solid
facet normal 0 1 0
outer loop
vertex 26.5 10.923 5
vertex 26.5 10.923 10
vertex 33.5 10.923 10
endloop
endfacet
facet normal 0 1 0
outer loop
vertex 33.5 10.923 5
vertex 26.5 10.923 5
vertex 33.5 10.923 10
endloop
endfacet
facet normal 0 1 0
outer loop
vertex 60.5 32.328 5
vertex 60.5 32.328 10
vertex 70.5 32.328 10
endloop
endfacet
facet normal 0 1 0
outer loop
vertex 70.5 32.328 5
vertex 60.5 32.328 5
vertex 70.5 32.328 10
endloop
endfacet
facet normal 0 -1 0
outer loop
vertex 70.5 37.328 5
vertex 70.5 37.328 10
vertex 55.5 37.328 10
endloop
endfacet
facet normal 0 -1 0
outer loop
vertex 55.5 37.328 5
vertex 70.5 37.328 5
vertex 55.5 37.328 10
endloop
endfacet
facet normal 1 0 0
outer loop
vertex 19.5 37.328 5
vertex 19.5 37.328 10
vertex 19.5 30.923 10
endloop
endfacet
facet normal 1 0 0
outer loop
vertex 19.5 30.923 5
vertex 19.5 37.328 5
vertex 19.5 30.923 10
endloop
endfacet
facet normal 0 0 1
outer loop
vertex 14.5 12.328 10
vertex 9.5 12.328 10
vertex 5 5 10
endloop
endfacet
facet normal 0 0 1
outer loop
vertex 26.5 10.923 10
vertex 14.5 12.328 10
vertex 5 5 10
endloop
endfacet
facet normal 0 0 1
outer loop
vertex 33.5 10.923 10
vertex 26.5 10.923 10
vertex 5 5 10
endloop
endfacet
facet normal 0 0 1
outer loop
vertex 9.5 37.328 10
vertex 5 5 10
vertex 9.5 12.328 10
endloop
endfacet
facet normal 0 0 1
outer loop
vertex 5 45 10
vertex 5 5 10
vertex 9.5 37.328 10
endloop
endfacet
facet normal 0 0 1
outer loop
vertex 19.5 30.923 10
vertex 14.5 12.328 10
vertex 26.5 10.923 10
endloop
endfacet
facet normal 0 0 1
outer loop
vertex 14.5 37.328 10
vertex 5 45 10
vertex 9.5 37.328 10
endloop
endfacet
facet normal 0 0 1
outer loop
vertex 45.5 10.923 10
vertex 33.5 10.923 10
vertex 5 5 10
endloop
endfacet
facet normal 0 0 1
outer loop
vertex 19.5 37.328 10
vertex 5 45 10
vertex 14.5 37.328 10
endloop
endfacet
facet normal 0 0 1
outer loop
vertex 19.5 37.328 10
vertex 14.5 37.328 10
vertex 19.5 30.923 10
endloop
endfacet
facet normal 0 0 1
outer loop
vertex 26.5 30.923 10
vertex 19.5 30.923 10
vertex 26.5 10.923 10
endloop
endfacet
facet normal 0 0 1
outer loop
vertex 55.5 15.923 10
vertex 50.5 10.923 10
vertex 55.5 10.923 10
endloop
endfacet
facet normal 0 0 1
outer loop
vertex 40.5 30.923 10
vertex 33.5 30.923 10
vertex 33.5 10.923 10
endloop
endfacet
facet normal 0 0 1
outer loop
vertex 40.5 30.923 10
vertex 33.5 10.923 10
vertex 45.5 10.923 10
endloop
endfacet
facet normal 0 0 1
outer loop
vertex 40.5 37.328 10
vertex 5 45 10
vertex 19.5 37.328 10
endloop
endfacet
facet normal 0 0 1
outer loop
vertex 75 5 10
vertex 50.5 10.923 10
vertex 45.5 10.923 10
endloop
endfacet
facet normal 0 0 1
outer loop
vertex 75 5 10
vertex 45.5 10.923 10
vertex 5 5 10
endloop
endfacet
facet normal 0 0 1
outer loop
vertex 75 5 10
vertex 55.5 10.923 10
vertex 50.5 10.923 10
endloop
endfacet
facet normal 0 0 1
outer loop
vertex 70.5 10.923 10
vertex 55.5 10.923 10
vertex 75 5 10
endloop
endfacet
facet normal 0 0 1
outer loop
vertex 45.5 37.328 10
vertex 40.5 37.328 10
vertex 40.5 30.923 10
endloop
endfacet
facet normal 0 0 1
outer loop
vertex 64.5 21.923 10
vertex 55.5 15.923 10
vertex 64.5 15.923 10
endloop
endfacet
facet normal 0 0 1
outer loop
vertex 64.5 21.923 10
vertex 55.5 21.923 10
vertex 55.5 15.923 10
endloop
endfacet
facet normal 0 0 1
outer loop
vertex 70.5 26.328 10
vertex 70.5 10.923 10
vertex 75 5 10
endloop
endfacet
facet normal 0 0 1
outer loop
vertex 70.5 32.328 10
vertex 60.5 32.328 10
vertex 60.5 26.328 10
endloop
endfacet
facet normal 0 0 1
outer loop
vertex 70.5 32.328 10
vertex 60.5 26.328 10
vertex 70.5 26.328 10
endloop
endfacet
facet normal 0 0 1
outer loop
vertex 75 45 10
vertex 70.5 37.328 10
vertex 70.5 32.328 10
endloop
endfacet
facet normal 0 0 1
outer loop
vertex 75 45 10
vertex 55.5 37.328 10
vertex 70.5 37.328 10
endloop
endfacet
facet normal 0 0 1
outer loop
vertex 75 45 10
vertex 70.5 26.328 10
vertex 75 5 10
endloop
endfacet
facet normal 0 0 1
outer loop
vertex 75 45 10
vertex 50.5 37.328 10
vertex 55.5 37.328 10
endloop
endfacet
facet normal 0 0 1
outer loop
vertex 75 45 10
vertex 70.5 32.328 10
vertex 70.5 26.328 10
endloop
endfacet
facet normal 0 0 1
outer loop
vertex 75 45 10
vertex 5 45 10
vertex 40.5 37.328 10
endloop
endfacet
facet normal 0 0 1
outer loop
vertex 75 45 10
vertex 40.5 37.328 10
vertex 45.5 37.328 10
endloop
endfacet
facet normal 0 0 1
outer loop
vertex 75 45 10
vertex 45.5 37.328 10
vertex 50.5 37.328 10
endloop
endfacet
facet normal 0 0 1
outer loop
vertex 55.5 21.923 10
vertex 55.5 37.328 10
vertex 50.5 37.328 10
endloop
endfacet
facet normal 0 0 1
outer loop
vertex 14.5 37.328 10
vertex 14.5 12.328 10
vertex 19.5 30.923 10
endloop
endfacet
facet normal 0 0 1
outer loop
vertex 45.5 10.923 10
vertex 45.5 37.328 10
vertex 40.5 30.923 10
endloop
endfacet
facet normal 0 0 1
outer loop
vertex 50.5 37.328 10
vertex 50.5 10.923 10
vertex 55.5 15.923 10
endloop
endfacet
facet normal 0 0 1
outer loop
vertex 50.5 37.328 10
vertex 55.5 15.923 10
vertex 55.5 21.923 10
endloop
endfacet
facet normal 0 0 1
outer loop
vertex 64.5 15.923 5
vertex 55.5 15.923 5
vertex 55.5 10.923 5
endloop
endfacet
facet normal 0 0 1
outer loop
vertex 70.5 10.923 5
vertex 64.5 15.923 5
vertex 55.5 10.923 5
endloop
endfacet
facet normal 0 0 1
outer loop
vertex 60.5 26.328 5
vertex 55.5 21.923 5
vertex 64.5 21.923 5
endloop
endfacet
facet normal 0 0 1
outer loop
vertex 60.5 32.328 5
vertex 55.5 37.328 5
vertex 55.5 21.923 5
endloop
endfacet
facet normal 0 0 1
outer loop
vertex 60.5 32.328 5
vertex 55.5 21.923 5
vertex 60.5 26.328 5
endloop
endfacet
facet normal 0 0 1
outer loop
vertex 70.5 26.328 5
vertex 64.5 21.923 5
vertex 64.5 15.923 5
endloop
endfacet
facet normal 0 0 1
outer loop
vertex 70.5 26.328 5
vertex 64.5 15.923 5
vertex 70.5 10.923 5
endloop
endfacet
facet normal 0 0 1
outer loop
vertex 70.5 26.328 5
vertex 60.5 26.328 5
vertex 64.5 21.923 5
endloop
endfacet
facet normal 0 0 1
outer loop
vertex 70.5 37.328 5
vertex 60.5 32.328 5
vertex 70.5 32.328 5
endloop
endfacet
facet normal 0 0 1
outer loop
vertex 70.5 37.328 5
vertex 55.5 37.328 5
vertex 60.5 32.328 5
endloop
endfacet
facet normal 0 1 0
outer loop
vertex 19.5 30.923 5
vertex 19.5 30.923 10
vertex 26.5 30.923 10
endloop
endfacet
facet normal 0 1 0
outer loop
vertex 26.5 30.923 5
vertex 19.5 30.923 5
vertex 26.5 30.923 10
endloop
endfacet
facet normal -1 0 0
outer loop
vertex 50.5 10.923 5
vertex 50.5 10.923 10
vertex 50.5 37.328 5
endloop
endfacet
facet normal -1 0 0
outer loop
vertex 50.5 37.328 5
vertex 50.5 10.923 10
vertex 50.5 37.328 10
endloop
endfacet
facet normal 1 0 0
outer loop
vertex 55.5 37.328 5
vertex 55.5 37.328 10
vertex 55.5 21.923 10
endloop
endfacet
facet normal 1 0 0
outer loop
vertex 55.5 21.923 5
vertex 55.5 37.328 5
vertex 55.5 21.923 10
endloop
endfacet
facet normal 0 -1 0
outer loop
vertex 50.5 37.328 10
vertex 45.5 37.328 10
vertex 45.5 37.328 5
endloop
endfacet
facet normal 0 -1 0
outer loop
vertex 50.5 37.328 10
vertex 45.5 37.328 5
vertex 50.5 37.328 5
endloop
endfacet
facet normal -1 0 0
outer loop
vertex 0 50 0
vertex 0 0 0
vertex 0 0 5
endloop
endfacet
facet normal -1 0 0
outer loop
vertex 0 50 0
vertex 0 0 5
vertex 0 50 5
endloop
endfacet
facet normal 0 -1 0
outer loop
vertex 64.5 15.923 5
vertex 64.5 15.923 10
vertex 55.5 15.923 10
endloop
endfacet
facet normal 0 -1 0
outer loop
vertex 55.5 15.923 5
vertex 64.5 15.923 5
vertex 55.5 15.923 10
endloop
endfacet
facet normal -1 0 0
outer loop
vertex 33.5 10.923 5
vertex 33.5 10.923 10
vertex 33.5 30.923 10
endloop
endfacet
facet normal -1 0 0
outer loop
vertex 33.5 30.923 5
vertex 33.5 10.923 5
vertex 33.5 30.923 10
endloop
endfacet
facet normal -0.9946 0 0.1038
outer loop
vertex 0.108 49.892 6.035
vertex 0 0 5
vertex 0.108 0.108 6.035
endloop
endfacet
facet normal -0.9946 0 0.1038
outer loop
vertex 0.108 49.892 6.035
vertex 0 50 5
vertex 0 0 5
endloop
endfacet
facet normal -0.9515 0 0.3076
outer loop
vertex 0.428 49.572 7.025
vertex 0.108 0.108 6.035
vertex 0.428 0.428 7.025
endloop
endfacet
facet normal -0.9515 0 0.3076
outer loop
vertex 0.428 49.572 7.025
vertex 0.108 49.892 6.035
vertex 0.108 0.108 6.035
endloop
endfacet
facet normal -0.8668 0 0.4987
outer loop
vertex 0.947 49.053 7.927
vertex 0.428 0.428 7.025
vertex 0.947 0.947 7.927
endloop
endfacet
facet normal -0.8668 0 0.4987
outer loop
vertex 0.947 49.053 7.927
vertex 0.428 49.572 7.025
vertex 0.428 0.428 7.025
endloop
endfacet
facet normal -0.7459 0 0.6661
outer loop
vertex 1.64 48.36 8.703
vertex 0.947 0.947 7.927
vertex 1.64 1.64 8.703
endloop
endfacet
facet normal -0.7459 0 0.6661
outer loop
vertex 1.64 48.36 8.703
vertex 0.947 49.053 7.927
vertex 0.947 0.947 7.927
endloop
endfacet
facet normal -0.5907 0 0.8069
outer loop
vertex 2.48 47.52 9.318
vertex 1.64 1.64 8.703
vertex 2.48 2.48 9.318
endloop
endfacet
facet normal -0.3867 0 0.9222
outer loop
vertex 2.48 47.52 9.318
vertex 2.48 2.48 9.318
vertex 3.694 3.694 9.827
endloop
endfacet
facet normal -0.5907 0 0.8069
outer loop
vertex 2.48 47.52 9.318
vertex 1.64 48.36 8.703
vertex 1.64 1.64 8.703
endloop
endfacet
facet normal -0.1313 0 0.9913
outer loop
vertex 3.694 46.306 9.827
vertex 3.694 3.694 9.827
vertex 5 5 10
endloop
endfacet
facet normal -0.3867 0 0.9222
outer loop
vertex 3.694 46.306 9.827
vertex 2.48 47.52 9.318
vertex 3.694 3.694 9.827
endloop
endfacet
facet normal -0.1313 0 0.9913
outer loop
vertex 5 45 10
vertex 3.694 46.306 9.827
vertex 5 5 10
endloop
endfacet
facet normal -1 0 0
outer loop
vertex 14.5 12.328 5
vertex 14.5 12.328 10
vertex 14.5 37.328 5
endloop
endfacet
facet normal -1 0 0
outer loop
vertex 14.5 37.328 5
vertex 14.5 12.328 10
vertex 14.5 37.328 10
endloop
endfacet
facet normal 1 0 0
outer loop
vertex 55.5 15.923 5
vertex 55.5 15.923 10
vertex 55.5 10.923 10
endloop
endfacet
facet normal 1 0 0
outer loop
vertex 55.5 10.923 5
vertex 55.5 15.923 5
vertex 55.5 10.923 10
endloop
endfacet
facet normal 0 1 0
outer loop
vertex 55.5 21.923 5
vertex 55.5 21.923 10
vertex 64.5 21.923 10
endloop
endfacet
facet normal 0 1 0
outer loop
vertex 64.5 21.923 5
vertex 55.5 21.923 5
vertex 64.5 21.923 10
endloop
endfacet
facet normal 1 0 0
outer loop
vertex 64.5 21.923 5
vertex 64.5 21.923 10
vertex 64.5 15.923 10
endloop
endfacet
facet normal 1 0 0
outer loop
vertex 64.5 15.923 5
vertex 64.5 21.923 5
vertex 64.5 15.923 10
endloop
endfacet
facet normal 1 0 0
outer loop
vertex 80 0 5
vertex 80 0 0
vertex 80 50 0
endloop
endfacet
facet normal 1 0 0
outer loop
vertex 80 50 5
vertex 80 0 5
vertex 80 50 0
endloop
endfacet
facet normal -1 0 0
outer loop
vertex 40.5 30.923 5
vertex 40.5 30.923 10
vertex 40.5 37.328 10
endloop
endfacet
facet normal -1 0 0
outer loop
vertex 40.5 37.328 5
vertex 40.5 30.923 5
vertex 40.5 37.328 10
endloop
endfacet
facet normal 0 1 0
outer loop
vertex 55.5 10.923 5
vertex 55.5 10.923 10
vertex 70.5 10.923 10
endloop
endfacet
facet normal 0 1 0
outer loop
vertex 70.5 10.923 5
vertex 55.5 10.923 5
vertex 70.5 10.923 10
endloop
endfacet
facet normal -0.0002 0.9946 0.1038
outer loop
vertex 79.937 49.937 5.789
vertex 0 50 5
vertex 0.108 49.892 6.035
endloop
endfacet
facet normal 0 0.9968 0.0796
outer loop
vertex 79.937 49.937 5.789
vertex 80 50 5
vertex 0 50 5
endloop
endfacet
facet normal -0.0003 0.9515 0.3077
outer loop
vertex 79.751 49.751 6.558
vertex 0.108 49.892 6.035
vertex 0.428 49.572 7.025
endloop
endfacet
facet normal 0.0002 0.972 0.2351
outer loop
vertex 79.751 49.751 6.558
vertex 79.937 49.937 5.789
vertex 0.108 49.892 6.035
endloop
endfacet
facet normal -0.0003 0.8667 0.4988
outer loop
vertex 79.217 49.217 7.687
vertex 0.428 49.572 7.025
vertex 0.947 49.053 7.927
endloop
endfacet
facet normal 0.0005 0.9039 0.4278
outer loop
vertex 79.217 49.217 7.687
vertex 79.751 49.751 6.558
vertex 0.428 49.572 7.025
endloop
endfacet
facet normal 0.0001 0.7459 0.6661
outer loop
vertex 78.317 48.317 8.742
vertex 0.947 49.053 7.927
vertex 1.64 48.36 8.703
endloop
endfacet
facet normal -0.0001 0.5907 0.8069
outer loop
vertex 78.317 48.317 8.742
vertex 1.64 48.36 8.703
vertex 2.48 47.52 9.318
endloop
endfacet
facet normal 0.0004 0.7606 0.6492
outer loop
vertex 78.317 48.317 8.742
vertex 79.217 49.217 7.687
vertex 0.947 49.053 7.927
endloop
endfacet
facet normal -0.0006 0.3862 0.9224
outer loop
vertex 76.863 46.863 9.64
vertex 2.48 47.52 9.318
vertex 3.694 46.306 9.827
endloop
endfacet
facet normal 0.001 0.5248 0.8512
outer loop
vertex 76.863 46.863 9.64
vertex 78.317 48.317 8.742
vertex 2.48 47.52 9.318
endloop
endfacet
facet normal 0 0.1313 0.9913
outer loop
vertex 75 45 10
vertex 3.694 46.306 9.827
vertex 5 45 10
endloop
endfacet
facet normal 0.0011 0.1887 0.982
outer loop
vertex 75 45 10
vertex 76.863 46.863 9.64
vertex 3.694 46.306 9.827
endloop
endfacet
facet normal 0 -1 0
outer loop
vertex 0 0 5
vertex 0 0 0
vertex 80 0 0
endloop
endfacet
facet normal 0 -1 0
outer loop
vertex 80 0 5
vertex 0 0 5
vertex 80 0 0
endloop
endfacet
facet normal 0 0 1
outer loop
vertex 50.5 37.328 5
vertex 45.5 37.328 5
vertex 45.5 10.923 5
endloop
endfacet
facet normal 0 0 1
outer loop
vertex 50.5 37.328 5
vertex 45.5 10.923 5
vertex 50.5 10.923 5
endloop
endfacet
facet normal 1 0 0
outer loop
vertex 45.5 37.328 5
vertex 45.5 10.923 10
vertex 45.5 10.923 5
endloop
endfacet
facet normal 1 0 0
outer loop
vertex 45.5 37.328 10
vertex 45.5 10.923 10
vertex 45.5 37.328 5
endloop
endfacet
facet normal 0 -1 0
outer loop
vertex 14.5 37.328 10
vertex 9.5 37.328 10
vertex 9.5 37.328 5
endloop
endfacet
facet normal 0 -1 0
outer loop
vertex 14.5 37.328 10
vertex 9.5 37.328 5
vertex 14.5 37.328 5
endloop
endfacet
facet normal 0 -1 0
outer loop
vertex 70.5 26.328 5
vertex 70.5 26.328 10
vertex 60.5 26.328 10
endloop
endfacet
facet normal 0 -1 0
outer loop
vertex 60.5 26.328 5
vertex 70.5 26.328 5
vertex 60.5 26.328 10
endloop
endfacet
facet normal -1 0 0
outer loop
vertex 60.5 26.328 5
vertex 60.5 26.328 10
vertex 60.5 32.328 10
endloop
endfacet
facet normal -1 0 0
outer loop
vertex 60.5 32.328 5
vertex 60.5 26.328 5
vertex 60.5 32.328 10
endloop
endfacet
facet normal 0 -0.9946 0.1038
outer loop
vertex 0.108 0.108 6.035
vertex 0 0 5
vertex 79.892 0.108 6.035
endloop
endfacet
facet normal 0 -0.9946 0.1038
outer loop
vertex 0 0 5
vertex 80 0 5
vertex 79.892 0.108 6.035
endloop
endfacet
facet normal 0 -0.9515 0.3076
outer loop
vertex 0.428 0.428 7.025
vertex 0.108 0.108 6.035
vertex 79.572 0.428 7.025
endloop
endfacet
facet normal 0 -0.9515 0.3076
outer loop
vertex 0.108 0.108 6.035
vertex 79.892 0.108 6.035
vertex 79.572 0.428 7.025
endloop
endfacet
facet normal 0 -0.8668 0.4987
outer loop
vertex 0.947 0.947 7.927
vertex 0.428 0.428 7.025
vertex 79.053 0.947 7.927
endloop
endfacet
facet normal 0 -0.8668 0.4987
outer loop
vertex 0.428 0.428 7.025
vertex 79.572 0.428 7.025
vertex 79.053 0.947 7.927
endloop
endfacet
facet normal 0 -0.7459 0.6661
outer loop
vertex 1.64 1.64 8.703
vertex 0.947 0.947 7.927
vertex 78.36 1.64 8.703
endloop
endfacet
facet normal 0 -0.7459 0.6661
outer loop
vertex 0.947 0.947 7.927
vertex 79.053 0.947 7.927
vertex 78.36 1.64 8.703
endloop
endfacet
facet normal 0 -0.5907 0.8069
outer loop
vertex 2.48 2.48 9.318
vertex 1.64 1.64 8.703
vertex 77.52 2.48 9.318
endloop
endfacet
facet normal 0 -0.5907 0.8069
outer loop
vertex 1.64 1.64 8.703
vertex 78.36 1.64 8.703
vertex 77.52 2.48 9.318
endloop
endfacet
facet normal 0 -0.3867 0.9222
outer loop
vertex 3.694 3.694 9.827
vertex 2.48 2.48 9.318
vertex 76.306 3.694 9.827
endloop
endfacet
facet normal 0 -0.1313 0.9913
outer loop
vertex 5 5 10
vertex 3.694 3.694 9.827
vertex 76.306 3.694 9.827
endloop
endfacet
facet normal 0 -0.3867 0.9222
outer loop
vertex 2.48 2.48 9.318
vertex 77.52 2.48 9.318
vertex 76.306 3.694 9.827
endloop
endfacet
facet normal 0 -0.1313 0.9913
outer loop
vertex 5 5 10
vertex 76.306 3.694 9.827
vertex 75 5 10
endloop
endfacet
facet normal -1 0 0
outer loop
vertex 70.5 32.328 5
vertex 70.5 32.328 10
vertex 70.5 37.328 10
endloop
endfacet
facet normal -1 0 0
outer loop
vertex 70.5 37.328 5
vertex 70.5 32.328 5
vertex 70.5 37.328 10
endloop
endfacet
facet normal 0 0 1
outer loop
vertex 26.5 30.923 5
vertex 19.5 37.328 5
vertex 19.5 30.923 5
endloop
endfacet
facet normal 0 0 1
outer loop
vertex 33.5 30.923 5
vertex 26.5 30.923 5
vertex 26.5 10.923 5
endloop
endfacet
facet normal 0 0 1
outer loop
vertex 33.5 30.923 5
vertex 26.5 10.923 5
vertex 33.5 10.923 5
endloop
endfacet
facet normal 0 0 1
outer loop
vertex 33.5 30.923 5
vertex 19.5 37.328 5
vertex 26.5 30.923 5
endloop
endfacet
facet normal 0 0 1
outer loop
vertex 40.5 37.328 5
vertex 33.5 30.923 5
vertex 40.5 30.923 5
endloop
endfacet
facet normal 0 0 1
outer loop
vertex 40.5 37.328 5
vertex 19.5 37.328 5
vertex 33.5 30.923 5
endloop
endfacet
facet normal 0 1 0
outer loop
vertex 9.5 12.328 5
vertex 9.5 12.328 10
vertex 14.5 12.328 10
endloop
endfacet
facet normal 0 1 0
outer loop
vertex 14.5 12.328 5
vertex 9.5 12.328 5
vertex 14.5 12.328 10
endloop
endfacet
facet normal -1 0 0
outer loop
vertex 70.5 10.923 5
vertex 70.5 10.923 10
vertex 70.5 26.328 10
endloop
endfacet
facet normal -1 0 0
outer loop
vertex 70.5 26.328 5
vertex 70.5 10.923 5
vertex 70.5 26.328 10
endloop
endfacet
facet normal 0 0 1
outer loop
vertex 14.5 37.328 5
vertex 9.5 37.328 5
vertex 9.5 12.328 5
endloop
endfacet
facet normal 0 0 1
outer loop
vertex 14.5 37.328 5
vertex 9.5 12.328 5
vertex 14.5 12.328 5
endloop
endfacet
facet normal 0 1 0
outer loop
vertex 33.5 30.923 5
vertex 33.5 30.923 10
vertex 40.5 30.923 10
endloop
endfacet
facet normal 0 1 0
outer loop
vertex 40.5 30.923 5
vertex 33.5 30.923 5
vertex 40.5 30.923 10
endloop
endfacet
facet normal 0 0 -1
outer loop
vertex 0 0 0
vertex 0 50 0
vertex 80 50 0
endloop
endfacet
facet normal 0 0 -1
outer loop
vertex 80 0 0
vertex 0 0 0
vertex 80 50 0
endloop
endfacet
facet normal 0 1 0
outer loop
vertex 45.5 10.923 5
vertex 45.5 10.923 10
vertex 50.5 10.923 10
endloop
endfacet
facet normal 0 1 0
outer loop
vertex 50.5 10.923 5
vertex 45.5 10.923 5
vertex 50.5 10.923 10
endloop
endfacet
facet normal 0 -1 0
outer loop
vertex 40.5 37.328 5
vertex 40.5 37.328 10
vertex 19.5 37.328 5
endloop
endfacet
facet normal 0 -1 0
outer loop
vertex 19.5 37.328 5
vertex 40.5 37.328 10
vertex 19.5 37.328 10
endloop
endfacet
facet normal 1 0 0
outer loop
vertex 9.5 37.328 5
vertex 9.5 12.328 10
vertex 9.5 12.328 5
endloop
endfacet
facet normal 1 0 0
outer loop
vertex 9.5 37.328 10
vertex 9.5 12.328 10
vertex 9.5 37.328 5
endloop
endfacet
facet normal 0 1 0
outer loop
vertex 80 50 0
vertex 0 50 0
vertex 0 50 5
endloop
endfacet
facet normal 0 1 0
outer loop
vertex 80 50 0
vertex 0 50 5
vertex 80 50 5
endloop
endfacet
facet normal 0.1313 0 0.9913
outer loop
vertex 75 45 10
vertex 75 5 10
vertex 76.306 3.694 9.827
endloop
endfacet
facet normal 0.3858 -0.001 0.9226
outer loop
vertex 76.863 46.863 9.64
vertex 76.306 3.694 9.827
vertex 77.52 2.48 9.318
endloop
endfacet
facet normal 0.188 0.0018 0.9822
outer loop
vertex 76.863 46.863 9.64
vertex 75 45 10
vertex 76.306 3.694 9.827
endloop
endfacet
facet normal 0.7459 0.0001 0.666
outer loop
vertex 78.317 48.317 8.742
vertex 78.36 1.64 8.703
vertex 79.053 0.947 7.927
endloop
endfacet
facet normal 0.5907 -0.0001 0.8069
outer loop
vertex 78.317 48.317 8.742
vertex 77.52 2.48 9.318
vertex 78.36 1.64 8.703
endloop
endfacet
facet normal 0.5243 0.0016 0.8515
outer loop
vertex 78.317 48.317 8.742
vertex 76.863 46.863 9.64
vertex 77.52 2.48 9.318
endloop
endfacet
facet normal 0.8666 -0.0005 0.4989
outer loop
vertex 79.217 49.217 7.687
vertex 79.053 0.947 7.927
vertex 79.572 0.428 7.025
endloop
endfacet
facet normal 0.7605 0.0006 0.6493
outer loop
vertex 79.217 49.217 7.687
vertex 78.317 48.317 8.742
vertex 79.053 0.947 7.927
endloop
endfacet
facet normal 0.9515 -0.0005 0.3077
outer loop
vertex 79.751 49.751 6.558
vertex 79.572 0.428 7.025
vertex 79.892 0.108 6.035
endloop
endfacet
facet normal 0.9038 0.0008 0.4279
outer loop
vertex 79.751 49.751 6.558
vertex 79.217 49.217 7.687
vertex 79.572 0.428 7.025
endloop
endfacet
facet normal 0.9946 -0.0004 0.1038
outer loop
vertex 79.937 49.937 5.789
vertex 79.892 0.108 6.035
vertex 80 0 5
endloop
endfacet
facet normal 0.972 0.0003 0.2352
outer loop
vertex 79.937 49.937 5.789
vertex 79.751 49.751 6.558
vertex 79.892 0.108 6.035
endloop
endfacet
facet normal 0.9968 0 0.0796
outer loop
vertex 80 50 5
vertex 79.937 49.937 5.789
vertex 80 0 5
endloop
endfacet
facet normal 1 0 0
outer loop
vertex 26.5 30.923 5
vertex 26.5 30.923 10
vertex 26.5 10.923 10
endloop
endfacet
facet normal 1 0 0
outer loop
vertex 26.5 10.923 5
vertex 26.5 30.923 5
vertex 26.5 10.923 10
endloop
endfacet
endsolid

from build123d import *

# Parameters (mm, degrees)
F0_W     = 80
F0_H     = 50
F1_DEPTH = 10
F2_W     = 5
F2_H     = 25
F2_H_2   = 26.404956
F3_DEPTH = 5
F4_R     = 5


with BuildPart() as f1:
    # F0 (on Top) → F1 (new body)
    with BuildSketch(Plane.XY):
        with Locations((40, 25)):
            Rectangle(F0_W, F0_H)
    extrude(amount=F1_DEPTH)

    # F2 (on face) → F3 (cut)
    with BuildSketch(Plane.XY.offset(10)):
        with Locations((12, 24.827586)):
            Rectangle(F2_W, F2_H)
        Polygon((26.5, 30.92263), (26.5, 10.92263), (33.5, 10.92263), (33.5, 30.92263), (40.5, 30.92263), (40.5, 37.327586), (19.5, 37.327586), (19.5, 30.92263), align=None)
        with Locations((48, 24.125108)):
            Rectangle(F2_W, F2_H_2)
        Polygon((70.5, 32.327586), (70.5, 37.327586), (55.5, 37.327586), (55.5, 21.92263), (64.5, 21.92263), (64.5, 15.92263), (55.5, 15.92263), (55.5, 10.92263), (70.5, 10.92263), (70.5, 26.327586), (60.5, 26.327586), (60.5, 32.327586), align=None)
    extrude(amount=-F3_DEPTH, mode=Mode.SUBTRACT)

    # F4
    f4_edges = [f1.edges().sort_by_distance(p)[0] for p in [
        (0, 25, 10),
        (40, 0, 10),
        (80, 25, 10),
        (40, 50, 10),
    ]]
    fillet(f4_edges, radius=F4_R)


solid = f1.part
